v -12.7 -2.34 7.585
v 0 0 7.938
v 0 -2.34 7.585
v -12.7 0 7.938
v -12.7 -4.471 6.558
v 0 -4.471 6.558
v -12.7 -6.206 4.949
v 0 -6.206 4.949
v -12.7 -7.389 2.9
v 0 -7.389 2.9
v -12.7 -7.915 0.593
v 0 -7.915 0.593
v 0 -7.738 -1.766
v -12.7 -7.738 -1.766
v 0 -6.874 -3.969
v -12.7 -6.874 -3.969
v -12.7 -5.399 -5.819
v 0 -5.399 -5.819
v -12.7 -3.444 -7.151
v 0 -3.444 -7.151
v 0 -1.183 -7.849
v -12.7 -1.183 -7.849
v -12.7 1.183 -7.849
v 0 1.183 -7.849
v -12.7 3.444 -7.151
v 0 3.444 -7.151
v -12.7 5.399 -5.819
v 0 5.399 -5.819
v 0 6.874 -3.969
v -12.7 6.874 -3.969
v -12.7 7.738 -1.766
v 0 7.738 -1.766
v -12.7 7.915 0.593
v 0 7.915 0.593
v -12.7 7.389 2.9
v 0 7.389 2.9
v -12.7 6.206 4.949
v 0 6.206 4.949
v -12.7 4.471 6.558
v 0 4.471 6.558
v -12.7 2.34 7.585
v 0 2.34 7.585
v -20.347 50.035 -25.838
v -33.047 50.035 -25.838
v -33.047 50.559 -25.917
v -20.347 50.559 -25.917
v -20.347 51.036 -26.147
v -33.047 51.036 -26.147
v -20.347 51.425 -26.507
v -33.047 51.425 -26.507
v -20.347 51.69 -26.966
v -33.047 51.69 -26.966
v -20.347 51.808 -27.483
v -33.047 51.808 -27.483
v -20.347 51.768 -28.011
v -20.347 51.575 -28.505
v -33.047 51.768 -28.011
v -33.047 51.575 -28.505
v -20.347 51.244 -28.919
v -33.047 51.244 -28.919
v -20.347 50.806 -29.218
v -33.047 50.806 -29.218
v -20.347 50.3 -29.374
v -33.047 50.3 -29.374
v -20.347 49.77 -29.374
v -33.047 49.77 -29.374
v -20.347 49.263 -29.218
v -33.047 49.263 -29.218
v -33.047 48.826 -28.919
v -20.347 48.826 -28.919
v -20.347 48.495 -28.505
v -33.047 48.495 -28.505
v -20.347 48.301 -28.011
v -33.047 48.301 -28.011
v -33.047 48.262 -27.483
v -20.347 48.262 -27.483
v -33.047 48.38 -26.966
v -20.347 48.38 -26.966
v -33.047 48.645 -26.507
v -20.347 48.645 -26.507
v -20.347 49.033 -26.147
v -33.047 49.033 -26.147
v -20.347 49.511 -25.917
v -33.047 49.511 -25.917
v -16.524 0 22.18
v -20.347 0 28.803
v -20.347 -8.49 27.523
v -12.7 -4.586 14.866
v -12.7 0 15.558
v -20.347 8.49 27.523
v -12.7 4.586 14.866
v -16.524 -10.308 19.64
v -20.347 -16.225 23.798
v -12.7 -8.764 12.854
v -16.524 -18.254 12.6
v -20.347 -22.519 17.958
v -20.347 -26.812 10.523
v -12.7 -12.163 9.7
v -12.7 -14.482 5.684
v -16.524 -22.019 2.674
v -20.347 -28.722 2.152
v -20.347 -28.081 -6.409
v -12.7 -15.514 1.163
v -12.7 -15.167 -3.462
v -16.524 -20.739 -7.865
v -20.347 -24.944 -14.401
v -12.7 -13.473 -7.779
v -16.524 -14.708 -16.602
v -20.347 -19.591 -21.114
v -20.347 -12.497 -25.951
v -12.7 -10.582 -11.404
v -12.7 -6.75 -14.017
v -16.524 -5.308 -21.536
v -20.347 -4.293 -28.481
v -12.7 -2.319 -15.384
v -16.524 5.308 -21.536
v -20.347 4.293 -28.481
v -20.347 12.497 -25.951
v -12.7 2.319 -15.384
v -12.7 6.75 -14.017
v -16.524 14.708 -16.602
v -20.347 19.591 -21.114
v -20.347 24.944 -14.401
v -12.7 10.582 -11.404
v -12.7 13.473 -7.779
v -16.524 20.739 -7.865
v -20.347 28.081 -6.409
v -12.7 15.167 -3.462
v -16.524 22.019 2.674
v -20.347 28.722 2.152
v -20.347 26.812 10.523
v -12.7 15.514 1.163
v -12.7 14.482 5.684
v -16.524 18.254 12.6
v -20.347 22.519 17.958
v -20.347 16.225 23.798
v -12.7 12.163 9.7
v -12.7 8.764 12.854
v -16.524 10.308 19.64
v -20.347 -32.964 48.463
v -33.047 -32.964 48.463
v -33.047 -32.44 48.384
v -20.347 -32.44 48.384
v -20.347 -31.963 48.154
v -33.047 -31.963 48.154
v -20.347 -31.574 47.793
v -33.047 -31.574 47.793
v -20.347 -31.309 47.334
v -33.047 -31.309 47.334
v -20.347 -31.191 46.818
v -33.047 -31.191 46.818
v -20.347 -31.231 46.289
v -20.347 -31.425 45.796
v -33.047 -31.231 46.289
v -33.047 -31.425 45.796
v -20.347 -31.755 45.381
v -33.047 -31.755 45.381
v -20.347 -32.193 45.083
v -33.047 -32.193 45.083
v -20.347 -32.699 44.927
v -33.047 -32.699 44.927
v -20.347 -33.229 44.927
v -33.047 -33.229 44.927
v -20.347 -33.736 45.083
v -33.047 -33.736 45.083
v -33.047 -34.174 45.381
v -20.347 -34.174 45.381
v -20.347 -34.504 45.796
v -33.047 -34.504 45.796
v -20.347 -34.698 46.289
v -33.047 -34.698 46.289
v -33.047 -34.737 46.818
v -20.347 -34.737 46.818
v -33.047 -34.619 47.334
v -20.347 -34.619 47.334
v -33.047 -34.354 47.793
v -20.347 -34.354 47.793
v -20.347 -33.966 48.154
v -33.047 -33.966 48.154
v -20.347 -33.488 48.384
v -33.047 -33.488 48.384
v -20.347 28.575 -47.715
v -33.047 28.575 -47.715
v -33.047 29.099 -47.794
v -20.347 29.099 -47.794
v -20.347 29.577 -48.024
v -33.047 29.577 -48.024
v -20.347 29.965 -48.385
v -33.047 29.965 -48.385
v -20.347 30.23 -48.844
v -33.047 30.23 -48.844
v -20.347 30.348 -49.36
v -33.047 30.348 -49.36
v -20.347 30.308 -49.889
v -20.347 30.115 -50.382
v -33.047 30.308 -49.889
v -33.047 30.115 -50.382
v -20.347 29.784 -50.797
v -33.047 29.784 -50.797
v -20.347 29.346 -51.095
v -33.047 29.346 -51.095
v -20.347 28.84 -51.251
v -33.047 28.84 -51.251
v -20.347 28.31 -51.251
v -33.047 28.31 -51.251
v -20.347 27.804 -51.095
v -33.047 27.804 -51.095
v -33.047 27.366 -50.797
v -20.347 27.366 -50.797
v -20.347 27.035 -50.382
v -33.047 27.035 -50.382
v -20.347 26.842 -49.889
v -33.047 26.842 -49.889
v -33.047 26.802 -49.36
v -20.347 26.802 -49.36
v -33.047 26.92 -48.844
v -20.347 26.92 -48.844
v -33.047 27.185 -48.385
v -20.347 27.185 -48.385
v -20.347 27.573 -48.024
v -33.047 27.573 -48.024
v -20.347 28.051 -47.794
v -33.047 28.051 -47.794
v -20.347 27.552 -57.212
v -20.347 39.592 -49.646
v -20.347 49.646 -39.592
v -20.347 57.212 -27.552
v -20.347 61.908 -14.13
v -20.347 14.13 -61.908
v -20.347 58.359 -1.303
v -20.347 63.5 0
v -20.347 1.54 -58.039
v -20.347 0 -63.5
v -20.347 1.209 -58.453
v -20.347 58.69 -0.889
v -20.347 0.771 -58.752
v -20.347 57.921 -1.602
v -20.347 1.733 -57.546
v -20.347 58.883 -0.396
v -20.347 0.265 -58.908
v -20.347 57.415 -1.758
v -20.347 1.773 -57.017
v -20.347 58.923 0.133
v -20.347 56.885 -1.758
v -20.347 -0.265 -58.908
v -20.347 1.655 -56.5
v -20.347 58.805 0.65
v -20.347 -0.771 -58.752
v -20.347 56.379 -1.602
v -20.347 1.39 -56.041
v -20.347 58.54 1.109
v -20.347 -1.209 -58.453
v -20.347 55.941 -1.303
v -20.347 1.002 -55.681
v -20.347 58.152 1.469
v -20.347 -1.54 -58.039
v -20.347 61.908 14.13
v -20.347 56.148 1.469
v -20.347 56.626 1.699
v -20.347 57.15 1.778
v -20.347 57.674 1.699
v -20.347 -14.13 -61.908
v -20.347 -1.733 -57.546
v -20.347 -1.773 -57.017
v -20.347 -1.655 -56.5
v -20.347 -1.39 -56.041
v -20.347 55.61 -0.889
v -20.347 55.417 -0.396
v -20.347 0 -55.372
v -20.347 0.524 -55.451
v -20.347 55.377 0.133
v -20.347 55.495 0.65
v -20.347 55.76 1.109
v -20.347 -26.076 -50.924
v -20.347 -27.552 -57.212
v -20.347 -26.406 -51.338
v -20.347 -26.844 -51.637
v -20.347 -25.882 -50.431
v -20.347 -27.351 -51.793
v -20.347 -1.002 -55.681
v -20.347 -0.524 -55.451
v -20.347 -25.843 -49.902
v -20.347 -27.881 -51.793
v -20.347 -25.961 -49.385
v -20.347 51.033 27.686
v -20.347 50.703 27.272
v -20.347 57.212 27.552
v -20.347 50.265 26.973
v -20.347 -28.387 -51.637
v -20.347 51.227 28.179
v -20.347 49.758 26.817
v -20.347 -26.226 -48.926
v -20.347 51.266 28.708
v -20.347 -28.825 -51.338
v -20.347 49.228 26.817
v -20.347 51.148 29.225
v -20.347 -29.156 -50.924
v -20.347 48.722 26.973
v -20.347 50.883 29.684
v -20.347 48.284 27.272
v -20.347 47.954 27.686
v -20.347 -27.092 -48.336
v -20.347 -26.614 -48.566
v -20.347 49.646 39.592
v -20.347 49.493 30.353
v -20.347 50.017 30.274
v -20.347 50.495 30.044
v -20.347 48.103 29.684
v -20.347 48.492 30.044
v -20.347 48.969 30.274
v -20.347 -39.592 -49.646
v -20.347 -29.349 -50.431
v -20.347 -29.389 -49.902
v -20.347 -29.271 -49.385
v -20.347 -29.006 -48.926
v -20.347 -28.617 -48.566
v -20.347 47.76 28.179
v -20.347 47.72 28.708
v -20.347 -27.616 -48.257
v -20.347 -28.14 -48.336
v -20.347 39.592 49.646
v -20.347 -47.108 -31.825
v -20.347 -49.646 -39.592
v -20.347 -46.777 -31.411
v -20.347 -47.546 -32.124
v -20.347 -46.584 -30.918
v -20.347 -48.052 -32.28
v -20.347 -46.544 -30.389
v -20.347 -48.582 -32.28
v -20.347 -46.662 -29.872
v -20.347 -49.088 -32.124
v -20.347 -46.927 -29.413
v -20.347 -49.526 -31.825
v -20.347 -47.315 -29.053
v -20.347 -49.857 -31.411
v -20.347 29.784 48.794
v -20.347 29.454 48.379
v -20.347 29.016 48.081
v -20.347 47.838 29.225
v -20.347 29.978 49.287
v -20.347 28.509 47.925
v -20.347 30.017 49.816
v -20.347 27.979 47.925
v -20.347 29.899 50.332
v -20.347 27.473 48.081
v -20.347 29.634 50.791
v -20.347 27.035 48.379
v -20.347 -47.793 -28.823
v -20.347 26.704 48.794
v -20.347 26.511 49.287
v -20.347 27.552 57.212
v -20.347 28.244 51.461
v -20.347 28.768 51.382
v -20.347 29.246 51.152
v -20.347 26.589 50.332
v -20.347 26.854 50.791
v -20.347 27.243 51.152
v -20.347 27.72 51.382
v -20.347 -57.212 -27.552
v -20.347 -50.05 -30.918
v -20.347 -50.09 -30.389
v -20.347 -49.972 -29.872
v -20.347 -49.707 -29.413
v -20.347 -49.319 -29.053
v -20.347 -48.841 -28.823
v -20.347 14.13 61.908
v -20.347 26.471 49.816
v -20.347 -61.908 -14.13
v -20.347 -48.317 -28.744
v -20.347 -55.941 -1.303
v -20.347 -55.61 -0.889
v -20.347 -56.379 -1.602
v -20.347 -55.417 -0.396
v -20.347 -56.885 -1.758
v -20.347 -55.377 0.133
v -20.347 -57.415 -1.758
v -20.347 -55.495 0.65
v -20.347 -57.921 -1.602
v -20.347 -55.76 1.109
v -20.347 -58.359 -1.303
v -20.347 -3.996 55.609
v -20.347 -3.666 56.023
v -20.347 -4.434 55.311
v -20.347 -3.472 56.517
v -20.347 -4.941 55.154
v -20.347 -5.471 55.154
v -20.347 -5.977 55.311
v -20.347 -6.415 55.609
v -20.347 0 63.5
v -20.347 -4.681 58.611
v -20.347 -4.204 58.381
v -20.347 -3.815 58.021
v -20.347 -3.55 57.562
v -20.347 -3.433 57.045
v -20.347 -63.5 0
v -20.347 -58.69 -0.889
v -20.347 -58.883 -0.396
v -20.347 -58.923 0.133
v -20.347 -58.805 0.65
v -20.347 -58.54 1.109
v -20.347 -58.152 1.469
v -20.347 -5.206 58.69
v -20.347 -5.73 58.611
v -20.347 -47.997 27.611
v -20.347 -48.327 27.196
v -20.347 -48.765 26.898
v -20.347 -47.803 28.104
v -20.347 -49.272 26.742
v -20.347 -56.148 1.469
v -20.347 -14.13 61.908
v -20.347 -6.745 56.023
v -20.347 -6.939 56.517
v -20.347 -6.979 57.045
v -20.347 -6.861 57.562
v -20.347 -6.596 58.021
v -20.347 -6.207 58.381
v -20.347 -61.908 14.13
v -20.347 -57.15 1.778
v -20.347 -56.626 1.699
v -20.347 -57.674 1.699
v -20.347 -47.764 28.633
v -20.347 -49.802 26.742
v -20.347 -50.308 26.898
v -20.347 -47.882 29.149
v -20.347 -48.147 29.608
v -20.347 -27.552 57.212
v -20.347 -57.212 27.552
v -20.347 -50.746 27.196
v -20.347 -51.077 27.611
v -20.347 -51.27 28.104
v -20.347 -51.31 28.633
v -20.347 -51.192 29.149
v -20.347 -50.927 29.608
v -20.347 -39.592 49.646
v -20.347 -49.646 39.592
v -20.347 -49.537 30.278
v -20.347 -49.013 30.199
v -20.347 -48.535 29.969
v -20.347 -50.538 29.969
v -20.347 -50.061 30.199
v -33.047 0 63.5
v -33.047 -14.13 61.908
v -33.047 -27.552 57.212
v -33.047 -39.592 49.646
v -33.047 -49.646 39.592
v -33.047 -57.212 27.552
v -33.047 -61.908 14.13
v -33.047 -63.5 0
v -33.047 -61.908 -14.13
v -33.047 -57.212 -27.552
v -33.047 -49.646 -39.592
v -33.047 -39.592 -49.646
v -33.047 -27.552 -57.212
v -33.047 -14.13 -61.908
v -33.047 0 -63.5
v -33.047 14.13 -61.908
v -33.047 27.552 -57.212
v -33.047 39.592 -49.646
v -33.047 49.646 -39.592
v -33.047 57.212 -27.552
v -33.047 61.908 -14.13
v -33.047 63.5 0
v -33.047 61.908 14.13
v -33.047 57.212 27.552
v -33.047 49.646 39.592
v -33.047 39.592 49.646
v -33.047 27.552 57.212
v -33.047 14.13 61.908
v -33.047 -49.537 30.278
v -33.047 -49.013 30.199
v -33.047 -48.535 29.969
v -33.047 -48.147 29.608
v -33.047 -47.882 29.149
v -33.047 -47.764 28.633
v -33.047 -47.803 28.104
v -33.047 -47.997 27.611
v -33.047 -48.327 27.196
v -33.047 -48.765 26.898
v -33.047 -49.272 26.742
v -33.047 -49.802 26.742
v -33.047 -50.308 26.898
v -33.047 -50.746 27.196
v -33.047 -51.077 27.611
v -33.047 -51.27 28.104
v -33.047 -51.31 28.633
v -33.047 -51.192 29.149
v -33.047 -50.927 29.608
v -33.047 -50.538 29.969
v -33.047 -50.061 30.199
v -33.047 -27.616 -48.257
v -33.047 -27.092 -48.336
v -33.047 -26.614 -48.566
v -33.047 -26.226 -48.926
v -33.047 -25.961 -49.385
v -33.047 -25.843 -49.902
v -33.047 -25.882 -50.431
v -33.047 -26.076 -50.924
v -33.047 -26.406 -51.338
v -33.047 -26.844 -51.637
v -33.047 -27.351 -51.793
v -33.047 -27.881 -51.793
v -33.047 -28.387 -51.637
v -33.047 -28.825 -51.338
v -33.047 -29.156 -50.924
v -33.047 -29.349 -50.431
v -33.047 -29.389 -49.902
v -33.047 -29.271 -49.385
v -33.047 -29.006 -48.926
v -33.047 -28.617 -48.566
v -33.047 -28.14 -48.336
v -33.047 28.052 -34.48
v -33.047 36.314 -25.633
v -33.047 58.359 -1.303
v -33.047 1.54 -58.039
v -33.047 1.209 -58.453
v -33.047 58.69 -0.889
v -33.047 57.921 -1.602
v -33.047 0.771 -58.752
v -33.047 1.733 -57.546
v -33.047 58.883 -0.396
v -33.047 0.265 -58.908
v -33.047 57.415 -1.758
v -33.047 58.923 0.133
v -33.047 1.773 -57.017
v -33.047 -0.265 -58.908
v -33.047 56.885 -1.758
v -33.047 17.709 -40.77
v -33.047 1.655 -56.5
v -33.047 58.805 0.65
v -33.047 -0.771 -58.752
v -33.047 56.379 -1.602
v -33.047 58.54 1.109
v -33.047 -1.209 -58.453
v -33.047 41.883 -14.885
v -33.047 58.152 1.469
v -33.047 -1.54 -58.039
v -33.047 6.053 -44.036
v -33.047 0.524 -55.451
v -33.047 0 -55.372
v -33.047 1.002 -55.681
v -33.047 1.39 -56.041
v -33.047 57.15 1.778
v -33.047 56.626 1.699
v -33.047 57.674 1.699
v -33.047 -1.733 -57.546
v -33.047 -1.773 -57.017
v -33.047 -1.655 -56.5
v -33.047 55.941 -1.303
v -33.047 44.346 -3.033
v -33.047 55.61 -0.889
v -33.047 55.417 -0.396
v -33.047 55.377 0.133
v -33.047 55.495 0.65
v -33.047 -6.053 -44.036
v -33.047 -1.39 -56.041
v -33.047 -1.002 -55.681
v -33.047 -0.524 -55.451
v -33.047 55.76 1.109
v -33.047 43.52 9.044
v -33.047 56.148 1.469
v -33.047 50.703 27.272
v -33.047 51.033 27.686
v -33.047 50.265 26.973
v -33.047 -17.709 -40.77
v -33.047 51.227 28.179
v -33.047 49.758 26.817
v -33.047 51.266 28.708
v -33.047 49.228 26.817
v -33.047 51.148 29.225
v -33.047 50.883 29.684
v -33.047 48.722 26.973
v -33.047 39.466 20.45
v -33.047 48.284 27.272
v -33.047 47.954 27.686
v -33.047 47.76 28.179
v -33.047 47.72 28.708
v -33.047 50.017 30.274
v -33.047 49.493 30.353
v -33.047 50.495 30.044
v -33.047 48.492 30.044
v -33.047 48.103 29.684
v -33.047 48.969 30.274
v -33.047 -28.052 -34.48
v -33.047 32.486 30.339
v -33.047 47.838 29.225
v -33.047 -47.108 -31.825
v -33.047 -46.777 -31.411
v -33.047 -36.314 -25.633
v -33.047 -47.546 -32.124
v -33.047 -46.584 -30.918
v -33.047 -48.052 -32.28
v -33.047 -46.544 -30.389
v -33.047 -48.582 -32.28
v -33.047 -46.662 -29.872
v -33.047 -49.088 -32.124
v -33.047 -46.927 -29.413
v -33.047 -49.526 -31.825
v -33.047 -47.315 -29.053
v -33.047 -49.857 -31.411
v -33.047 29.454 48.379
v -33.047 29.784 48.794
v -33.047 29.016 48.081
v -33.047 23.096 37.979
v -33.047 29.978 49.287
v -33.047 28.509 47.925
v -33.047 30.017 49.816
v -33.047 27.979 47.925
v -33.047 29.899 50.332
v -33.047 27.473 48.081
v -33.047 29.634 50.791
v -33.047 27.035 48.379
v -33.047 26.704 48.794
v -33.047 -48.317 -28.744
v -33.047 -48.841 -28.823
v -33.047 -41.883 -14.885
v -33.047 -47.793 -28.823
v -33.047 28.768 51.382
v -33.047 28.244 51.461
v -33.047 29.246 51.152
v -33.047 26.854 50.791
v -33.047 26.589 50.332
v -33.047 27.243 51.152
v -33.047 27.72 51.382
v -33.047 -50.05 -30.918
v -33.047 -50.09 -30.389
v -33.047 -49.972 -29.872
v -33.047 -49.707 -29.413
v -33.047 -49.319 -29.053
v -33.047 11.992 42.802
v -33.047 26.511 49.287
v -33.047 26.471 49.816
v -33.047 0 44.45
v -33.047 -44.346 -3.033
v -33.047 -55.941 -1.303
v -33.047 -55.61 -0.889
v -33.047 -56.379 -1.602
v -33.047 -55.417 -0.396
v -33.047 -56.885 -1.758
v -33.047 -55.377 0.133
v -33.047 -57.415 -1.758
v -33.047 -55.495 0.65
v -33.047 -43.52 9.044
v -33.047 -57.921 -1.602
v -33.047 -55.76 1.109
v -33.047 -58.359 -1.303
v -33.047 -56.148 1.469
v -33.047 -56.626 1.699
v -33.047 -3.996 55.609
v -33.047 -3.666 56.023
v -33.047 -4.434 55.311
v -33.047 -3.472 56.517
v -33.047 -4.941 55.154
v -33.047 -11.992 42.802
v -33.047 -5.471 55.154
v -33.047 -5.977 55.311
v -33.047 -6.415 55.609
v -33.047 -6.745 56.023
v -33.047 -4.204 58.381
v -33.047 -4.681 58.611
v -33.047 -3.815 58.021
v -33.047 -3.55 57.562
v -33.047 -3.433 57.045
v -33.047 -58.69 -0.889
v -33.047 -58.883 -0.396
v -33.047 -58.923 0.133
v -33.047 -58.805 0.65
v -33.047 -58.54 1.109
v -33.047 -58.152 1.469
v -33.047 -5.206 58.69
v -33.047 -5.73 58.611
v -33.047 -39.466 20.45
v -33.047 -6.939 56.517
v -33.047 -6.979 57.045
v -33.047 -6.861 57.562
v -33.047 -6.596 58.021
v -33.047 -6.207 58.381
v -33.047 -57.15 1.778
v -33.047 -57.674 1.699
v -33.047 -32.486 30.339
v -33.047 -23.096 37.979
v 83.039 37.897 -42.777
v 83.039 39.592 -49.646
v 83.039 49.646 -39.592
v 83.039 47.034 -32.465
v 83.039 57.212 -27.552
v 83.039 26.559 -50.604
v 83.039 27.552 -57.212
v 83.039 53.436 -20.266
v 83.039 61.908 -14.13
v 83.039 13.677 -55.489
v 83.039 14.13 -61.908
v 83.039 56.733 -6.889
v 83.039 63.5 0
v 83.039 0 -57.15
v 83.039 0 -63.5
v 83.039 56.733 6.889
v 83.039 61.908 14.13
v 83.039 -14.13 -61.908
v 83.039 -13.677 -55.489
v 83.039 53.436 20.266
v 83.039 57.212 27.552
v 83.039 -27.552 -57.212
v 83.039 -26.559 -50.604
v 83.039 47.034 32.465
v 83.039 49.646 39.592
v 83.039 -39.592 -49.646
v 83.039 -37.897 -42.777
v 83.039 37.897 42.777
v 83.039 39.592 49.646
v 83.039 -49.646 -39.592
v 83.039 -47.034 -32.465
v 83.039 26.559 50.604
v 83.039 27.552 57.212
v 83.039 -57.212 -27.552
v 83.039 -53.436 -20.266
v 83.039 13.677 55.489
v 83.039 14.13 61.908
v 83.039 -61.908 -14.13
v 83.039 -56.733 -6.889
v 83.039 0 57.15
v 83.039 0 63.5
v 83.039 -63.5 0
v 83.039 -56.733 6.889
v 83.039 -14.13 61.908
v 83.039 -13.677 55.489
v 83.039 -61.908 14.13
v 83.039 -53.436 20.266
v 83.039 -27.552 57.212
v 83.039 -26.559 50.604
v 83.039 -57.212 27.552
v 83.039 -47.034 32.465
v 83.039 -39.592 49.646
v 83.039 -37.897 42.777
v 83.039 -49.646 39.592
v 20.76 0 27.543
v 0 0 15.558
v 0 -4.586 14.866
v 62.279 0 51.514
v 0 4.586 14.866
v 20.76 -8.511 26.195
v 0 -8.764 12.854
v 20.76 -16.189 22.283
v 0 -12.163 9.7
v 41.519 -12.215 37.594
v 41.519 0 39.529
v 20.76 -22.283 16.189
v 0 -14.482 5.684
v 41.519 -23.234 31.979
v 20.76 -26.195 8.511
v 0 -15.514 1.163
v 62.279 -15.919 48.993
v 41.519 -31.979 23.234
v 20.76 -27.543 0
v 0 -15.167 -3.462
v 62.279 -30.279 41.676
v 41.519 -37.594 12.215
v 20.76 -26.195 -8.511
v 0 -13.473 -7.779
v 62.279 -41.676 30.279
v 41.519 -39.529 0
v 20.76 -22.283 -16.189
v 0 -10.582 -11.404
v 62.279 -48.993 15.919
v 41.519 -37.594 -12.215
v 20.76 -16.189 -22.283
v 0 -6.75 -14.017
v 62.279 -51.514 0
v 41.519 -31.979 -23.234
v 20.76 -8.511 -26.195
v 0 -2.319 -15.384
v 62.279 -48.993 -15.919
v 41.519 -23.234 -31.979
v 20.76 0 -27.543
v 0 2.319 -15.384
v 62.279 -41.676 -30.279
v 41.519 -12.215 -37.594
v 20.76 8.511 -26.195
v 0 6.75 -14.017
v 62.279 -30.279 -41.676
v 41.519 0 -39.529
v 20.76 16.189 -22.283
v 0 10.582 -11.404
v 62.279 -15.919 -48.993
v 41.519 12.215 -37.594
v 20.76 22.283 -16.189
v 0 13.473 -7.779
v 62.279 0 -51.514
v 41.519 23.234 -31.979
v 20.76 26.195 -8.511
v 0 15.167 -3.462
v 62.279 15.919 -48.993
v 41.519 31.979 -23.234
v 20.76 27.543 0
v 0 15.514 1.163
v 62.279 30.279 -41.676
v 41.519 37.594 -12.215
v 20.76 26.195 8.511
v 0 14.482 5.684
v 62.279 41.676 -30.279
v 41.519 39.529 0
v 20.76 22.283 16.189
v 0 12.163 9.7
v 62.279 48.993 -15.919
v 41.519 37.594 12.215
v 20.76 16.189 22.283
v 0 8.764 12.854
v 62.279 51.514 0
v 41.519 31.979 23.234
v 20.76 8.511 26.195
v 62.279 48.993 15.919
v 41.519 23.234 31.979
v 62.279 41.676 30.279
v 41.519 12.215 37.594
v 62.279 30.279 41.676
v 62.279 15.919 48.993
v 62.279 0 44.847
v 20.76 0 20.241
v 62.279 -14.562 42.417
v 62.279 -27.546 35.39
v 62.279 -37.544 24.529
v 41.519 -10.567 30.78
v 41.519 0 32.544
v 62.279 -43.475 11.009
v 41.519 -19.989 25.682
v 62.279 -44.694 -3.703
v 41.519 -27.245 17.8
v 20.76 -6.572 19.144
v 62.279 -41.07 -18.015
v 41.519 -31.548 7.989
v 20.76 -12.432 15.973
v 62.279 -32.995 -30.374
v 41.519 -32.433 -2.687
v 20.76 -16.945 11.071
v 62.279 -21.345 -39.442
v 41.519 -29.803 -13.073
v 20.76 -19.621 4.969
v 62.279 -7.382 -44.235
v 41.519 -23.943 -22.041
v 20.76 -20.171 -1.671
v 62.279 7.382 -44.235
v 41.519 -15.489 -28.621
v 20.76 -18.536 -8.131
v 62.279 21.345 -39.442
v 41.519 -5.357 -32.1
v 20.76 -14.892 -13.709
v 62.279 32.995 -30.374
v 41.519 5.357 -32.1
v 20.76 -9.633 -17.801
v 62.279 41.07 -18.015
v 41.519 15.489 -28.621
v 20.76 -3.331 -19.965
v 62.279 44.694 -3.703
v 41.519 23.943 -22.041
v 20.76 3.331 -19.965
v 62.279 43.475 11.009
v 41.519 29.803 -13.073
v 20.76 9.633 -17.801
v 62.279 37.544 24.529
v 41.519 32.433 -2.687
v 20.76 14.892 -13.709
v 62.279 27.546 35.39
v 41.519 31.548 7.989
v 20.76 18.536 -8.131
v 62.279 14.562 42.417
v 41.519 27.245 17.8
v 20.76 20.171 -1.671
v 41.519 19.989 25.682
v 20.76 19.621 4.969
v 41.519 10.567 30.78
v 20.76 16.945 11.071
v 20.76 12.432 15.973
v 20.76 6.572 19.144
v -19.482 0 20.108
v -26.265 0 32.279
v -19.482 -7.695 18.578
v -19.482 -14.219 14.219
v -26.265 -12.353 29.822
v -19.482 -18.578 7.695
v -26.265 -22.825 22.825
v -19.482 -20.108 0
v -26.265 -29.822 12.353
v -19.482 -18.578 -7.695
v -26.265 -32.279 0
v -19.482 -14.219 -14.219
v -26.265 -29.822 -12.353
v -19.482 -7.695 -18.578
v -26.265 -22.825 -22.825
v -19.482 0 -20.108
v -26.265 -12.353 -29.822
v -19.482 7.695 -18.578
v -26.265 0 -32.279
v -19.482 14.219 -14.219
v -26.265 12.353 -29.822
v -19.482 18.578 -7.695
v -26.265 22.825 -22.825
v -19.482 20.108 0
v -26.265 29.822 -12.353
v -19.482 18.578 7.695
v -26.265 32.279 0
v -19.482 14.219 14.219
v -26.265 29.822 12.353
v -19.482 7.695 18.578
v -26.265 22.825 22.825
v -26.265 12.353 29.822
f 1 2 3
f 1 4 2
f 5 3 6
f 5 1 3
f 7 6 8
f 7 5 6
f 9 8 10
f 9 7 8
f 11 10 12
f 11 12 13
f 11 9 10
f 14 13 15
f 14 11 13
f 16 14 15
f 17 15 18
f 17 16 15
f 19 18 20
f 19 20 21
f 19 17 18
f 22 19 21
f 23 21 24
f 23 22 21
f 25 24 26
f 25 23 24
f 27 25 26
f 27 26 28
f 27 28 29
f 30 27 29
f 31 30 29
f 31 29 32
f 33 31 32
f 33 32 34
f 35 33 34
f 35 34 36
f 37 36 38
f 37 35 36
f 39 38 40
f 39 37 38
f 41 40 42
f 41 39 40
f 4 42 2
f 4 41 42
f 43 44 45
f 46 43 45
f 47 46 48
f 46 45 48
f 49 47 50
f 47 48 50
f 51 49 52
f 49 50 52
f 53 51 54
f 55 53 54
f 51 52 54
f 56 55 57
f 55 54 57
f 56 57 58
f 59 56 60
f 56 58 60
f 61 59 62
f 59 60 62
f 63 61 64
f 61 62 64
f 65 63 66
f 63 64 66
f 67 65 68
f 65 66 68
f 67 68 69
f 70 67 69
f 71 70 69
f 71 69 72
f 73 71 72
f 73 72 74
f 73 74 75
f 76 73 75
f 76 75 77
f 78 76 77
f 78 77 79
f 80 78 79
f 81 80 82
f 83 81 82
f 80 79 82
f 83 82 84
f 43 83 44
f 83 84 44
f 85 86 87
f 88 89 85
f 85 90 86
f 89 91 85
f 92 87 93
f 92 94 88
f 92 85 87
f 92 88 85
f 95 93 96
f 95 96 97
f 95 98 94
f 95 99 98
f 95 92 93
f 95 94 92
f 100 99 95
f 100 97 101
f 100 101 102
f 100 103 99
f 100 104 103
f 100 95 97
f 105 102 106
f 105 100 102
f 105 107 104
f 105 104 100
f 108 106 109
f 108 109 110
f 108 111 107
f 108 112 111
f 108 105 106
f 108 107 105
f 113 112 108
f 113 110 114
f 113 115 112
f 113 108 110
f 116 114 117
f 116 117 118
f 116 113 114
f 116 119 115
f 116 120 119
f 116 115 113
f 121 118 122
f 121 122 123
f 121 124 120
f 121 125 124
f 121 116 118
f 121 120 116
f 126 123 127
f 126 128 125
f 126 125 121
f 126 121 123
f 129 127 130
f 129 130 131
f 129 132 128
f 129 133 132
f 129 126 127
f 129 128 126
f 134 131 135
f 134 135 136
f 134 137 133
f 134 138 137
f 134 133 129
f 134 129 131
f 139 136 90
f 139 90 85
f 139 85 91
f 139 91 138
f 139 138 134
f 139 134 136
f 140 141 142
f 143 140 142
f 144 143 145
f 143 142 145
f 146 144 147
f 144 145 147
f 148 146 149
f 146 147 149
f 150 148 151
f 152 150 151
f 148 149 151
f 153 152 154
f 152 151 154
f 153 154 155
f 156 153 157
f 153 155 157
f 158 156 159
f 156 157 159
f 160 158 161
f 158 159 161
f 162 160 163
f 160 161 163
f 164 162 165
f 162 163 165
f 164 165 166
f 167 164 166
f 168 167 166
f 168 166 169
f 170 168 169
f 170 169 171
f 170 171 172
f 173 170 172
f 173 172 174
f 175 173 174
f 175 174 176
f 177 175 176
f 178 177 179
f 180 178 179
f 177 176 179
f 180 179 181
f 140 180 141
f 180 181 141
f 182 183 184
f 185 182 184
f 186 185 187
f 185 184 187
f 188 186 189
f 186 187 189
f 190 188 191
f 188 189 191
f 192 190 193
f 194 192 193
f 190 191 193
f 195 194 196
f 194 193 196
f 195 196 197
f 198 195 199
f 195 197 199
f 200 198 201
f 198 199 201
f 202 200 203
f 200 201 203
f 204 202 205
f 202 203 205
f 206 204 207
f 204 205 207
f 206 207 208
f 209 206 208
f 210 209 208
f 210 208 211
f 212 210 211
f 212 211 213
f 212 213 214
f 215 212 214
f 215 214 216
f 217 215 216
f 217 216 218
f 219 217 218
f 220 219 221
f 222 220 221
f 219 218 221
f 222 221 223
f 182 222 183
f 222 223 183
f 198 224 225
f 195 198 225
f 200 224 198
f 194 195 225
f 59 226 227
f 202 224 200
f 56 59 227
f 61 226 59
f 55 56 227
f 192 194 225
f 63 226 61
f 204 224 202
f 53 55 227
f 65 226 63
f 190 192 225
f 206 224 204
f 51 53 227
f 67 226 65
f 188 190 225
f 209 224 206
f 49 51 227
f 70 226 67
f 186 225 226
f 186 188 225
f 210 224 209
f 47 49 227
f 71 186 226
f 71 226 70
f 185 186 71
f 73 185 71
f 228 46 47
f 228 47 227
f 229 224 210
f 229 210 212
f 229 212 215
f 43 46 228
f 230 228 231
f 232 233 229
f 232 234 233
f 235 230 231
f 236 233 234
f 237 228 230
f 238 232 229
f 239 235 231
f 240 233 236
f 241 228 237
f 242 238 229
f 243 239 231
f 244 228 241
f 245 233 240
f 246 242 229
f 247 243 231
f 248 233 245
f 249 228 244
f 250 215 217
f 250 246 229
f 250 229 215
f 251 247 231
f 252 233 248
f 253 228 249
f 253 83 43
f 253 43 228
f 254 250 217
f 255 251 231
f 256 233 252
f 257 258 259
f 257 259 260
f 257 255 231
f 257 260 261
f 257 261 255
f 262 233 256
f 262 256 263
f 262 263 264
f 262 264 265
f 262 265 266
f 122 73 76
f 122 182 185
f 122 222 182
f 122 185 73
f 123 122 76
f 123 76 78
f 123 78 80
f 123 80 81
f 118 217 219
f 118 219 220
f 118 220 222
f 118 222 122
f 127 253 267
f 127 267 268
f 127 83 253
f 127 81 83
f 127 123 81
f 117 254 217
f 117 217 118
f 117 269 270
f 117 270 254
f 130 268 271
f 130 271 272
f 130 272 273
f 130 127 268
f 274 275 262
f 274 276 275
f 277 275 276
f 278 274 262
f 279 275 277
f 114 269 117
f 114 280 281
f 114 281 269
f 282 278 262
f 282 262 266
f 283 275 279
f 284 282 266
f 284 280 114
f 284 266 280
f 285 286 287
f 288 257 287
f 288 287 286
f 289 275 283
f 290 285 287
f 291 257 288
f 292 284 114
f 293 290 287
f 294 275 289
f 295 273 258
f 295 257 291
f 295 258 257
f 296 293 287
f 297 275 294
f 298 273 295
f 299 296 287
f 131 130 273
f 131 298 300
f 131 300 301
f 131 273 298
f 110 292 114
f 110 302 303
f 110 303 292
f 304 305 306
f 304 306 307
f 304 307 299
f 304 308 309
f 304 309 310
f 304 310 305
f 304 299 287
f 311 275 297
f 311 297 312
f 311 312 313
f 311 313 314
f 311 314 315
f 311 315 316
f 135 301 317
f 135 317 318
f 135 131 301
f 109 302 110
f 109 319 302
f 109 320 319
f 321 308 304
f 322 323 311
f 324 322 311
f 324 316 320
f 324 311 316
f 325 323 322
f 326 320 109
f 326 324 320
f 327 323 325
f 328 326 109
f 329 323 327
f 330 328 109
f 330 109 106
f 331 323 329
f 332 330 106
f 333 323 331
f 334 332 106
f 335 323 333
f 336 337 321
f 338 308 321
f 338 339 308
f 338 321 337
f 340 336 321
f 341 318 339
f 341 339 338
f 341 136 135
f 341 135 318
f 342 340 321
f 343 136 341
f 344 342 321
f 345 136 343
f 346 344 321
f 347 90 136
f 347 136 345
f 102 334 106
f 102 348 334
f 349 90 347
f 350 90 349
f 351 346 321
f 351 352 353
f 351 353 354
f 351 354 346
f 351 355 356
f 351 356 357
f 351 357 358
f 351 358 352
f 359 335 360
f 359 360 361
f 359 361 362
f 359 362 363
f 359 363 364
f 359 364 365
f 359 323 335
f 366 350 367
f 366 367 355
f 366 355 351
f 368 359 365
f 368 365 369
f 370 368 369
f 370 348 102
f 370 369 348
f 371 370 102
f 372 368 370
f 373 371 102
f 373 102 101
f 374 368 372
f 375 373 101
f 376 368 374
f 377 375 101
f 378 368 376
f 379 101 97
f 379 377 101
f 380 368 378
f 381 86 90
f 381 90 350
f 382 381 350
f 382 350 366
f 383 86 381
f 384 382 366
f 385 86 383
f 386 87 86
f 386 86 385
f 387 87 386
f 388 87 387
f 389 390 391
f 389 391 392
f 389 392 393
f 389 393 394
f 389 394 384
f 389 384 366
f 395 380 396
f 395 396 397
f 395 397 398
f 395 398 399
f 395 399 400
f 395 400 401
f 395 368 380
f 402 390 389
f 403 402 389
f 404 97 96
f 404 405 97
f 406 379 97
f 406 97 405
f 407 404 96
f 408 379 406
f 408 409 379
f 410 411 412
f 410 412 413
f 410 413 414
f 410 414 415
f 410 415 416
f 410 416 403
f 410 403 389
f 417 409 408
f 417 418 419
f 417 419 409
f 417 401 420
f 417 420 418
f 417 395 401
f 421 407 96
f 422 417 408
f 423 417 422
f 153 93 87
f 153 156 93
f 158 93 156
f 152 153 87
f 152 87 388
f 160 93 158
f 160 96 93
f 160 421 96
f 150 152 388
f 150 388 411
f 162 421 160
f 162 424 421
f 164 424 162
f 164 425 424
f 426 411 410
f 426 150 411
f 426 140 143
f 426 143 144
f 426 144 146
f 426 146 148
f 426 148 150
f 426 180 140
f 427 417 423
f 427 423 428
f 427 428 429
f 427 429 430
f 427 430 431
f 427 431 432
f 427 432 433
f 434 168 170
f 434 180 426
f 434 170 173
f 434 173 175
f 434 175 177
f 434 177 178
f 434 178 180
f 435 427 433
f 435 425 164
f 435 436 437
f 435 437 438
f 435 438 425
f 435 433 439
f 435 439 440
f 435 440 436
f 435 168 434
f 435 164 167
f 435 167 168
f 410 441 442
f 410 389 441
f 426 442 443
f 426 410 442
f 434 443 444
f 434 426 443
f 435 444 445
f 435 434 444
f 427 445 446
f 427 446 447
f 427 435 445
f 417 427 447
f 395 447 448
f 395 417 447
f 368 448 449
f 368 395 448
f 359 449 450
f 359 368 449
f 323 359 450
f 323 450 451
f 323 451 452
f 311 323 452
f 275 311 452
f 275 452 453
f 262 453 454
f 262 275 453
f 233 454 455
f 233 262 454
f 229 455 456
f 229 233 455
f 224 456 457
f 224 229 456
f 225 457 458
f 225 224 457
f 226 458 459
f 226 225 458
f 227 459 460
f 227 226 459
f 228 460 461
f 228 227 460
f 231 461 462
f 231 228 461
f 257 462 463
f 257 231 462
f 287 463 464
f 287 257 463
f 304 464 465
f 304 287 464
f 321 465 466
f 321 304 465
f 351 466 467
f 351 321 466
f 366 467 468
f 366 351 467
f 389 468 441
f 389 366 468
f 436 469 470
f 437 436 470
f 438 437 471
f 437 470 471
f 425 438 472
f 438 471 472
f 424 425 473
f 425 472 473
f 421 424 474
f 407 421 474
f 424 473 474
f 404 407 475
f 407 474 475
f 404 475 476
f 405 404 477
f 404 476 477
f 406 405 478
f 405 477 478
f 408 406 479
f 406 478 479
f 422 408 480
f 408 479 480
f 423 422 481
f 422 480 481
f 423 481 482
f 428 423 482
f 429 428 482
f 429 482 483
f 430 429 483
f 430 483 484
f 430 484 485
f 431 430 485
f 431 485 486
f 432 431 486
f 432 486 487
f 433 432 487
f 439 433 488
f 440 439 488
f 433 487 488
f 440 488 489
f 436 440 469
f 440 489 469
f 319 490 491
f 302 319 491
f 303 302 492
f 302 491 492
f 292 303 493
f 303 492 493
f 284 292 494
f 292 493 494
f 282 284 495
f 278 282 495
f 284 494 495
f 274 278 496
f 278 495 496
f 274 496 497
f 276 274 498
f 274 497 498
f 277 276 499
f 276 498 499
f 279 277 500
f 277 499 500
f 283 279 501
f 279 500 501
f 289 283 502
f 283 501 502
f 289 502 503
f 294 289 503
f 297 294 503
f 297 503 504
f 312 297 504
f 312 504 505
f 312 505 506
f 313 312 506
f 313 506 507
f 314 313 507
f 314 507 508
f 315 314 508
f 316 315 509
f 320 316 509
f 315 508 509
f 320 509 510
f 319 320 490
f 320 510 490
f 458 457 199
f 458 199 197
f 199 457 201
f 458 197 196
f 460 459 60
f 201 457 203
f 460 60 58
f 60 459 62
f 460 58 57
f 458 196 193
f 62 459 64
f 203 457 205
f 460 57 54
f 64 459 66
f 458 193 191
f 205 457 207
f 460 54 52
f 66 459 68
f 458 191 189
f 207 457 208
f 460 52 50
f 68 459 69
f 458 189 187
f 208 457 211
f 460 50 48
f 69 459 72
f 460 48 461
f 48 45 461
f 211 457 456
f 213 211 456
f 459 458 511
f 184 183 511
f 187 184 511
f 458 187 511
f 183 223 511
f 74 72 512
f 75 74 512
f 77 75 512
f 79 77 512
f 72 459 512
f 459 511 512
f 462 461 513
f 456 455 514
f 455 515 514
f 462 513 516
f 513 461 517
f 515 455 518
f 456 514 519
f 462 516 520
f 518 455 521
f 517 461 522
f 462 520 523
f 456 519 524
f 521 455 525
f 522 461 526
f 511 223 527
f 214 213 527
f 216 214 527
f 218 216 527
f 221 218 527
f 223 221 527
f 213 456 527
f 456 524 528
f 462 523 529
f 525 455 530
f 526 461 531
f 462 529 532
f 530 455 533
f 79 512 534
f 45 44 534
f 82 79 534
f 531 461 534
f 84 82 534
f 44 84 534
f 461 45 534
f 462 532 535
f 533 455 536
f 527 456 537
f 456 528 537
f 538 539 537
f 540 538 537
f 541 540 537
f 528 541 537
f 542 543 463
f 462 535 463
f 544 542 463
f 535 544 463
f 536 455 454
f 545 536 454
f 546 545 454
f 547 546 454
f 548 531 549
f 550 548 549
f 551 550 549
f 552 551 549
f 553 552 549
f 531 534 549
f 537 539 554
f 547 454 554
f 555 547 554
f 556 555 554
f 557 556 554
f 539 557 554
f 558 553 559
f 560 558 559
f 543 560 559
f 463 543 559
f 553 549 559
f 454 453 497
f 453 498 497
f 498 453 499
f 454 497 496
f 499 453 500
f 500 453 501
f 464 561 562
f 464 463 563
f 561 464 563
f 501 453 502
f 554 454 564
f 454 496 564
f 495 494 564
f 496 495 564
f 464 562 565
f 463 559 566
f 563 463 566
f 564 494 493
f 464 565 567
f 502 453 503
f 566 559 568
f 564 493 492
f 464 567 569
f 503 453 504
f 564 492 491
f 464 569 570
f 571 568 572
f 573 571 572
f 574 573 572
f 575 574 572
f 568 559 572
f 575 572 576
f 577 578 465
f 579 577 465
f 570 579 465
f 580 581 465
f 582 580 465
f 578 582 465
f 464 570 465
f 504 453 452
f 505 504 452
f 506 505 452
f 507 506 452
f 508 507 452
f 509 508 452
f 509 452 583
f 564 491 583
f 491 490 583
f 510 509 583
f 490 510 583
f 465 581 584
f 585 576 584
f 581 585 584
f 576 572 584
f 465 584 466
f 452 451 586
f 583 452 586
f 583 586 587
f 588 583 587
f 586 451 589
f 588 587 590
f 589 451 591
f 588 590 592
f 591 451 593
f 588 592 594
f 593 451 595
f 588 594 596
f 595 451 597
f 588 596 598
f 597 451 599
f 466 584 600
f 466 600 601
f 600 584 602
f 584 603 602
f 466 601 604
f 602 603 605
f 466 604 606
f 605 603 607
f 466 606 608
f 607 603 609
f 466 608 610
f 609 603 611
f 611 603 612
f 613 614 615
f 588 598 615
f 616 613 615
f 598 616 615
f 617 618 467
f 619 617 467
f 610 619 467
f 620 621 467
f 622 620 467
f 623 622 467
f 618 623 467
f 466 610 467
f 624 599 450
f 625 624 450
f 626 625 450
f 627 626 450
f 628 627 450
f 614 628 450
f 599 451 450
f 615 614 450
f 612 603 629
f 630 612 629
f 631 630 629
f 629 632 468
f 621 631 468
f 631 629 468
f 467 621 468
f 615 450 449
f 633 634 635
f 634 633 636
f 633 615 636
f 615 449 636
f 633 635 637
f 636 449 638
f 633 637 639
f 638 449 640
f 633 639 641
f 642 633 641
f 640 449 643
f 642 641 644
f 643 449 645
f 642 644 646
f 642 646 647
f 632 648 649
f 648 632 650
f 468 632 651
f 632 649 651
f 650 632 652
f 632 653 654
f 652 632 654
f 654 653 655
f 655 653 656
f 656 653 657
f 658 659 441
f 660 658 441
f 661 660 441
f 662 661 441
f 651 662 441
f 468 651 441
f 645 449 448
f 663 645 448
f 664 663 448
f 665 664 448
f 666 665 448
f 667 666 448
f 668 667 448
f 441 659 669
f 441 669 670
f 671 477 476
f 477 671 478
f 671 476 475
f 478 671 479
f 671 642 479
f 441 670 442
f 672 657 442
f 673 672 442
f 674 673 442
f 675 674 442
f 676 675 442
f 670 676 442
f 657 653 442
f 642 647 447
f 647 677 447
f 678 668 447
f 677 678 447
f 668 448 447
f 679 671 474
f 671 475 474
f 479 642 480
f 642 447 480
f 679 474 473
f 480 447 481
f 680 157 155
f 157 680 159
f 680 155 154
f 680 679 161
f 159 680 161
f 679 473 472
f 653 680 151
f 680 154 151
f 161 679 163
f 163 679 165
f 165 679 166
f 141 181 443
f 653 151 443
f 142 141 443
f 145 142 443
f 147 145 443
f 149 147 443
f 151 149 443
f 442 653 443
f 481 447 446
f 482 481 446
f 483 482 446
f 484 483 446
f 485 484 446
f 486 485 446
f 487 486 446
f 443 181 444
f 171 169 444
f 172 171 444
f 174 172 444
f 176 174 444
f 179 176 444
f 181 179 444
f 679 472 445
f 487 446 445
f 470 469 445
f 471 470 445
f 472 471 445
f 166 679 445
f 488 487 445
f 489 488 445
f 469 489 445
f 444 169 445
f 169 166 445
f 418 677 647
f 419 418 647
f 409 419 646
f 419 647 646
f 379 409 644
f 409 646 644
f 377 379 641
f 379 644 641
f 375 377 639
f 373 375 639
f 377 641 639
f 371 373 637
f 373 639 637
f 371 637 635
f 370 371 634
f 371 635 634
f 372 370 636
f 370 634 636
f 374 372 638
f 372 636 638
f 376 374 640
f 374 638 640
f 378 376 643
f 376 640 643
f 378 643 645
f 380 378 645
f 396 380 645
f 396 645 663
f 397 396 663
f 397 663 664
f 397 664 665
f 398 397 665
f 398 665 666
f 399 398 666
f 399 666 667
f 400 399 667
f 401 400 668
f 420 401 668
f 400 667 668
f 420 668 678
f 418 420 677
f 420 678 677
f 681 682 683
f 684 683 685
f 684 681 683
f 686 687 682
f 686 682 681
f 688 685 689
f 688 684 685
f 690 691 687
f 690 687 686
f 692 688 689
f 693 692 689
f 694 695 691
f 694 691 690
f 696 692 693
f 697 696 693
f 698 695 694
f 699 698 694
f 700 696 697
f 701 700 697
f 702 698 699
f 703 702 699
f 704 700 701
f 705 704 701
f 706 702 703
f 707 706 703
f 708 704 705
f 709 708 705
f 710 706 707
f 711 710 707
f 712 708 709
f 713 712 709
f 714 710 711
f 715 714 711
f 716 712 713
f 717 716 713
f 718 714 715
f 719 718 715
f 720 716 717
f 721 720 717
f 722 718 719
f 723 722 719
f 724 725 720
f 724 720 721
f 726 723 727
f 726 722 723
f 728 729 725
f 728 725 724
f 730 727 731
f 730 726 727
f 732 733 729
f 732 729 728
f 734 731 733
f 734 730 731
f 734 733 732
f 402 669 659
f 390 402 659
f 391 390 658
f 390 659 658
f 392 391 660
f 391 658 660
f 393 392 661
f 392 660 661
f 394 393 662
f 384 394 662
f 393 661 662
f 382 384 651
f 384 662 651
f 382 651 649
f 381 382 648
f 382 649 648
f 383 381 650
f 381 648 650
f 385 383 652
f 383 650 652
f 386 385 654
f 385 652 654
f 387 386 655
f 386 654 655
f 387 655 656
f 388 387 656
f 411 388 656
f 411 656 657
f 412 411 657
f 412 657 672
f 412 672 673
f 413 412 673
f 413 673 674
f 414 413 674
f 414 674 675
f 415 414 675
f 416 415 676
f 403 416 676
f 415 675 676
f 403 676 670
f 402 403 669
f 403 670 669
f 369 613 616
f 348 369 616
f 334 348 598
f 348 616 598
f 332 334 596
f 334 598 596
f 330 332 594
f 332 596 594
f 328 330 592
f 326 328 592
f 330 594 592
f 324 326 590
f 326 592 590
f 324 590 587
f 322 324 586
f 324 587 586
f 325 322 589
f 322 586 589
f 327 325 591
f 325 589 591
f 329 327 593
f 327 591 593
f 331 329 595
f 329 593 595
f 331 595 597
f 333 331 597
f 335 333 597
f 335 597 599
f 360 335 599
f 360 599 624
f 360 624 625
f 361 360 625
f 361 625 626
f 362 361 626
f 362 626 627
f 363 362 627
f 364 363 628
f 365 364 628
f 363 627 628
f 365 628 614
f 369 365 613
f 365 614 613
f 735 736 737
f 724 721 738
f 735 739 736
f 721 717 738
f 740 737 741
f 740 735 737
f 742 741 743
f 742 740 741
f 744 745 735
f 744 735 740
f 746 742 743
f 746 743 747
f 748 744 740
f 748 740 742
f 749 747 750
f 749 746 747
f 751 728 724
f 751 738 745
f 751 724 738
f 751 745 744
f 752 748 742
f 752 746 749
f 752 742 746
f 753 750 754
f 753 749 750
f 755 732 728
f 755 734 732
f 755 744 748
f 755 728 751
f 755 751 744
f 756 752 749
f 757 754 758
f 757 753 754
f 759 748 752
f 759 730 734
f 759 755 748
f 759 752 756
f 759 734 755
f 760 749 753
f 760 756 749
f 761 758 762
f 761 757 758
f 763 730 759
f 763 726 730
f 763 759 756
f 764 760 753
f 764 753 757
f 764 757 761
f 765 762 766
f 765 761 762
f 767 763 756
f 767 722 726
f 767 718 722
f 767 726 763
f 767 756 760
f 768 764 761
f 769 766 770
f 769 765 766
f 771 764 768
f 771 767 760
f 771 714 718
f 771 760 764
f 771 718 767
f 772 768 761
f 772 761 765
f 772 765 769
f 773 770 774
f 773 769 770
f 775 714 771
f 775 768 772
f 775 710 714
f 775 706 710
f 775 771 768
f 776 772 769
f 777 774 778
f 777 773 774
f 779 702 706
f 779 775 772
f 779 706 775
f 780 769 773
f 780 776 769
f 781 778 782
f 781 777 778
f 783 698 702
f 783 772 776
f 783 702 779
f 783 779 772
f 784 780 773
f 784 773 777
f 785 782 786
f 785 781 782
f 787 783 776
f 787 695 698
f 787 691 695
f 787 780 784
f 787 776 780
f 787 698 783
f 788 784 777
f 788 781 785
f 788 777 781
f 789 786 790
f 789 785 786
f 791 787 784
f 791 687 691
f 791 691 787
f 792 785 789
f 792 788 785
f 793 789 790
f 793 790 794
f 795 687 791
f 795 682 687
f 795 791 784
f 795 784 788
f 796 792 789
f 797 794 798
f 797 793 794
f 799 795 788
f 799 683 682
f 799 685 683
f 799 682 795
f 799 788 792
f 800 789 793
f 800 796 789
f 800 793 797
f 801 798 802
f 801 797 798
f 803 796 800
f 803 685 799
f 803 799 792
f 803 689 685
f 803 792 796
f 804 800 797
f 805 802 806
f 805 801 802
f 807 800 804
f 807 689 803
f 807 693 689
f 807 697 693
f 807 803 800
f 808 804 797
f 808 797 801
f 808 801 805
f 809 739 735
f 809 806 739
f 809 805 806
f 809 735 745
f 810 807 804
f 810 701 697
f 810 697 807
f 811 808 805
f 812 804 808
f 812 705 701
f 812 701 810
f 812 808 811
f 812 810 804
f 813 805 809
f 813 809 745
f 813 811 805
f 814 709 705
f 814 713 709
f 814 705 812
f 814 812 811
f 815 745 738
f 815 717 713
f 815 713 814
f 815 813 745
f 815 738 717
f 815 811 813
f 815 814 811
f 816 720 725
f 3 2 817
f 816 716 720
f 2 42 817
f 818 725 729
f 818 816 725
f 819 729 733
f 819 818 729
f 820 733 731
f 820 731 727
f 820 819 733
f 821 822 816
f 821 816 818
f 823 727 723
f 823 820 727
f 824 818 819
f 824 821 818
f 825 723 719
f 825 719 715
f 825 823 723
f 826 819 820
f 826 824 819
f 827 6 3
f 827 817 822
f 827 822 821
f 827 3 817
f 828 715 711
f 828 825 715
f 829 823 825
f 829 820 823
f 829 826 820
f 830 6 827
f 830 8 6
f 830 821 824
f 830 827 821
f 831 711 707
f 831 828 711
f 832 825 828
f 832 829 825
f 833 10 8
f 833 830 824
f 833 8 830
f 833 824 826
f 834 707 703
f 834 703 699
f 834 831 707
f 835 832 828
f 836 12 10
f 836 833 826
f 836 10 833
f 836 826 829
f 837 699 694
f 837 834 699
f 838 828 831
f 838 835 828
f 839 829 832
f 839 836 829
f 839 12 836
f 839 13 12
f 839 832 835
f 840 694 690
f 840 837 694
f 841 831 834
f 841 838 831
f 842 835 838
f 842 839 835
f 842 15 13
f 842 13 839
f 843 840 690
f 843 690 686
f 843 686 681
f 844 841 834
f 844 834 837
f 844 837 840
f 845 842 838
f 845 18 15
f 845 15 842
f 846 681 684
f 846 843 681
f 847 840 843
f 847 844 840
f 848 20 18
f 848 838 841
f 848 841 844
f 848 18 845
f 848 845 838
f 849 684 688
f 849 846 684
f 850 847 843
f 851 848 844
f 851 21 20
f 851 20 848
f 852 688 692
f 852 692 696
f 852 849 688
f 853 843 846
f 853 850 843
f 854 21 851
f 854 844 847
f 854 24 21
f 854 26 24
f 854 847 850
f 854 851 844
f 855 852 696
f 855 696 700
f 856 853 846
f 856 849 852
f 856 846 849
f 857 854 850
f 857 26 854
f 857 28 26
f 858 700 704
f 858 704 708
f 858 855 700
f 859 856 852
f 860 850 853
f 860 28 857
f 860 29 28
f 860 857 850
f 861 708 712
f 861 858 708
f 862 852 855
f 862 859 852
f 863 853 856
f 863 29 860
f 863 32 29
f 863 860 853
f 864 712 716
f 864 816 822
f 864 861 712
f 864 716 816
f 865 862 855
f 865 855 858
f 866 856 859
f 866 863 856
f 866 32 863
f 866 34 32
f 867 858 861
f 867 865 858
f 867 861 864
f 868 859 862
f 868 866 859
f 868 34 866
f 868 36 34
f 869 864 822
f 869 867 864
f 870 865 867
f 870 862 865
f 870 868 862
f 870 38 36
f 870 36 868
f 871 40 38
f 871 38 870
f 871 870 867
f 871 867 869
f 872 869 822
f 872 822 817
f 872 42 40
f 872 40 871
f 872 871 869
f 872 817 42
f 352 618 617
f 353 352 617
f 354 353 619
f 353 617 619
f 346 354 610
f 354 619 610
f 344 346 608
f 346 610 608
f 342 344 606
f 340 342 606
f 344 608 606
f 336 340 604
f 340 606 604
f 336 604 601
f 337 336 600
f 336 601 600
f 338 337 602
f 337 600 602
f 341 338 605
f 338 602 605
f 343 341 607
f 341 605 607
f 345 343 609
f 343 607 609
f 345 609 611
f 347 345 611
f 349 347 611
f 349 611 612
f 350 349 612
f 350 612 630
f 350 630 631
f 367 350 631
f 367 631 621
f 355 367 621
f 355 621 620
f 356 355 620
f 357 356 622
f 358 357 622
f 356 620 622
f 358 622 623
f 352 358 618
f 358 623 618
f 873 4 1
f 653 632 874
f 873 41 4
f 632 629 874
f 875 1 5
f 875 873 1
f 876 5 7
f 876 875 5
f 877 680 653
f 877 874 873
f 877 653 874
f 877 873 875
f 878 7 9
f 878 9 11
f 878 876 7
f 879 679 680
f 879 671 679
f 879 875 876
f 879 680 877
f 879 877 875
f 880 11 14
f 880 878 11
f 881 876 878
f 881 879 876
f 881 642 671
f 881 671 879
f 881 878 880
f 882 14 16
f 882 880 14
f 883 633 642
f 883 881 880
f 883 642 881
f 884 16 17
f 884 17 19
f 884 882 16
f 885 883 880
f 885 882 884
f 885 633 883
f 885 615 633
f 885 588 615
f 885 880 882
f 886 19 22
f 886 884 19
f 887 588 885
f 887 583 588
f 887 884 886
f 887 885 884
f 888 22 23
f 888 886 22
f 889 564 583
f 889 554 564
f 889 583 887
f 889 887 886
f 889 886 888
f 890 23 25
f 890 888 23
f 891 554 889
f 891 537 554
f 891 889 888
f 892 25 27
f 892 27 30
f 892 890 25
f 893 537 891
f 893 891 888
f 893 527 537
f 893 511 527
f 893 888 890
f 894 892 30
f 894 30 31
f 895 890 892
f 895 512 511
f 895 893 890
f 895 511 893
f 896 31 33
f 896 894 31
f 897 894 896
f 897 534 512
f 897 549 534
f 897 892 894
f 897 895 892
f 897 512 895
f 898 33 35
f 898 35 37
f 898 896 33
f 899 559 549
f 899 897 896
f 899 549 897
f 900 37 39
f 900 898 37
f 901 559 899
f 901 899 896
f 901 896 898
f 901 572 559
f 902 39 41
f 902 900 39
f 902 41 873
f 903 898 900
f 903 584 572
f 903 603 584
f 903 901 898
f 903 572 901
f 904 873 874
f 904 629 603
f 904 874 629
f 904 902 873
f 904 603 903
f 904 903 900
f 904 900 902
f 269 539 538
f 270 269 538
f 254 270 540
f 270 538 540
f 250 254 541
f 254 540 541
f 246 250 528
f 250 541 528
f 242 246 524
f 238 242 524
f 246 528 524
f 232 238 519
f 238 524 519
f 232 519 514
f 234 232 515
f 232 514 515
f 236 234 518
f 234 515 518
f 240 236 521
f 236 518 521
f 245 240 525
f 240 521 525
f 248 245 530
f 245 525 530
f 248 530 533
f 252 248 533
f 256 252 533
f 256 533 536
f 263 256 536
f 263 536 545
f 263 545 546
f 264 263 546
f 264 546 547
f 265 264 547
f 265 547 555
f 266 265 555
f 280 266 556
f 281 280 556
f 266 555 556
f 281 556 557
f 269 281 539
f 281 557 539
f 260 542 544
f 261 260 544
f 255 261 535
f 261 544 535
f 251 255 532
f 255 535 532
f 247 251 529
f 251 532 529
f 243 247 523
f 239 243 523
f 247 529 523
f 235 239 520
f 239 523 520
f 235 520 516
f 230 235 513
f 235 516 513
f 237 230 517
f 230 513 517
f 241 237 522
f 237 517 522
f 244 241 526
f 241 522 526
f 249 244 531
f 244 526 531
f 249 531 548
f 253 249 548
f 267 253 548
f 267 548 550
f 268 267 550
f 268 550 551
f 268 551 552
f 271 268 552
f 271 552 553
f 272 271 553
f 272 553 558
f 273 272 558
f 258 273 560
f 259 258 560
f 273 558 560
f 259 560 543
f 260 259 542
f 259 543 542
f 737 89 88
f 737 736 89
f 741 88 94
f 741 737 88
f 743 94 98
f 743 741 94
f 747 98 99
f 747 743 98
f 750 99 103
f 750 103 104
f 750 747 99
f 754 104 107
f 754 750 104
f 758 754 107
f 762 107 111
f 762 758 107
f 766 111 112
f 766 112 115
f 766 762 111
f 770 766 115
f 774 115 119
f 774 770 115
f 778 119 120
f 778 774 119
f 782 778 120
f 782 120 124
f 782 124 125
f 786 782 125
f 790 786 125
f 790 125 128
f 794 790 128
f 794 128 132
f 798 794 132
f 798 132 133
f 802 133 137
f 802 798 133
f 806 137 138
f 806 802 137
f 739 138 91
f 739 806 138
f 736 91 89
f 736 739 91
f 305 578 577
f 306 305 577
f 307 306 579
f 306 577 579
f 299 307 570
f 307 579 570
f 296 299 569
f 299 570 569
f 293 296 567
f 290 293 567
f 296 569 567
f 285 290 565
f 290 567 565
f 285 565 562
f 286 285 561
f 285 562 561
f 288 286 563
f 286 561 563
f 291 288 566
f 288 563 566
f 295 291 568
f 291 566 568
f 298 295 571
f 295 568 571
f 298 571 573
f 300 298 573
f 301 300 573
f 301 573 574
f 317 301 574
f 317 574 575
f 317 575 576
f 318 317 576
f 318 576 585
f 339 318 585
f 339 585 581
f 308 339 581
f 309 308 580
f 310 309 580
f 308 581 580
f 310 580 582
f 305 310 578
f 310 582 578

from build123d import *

# Parameters (mm, degrees)
SKETCH3_R          = 1.778
CUT_EXTRUDE1_DEPTH = 12.7


with BuildPart() as part:
    # Sketch1 → Revolve1 (revolve)
    with BuildSketch(Plane.XY, mode=Mode.PRIVATE) as revolve1_sk:
        Polygon((0, 15.5575), (83.038845842, 63.5), (83.038845842, 57.15), (0, 7.9375), (-12.7, 7.9375), (-33.047266862, 44.45), (-33.047266862, 50.8), (-33.047266862, 63.5), (-20.347266862, 63.5), (-20.347266862, 28.802954744), (-12.7, 15.5575), align=None)
    revolve(revolve1_sk.sketch.rotate(Axis((0, 0, 0), (1, 0, 0)), 90), axis=Axis((0, 0, 0), (1, 0, 0)))

    # Sketch3 → Cut-Extrude1 (cut)
    with BuildSketch(Plane.ZY.offset(33.047266862)):
        with Locations((56.912428742, -5.205569588)):
            Circle(SKETCH3_R)
        with Locations((0, 57.15)):
            Circle(SKETCH3_R)
        with Locations((-57.15, 0)):
            Circle(SKETCH3_R)
        with Locations((-27.61584041, 50.034866428)):
            Circle(SKETCH3_R)
        with Locations((-49.493351826, 28.575)):
            Circle(SKETCH3_R)
        with Locations((28.575, 49.493351826)):
            Circle(SKETCH3_R)
        with Locations((49.682843524, 28.244248253)):
            Circle(SKETCH3_R)
        with Locations((-30.522003084, -48.31697246)):
            Circle(SKETCH3_R)
        with Locations((-50.034866428, -27.61584041)):
            Circle(SKETCH3_R)
        with Locations((46.684824287, -32.964369875)):
            Circle(SKETCH3_R)
        with Locations((28.49967153, -49.536766373)):
            Circle(SKETCH3_R)
        with Locations((0, -57.15)):
            Circle(SKETCH3_R)
    extrude(amount=-CUT_EXTRUDE1_DEPTH, mode=Mode.SUBTRACT)


solid = part.part
